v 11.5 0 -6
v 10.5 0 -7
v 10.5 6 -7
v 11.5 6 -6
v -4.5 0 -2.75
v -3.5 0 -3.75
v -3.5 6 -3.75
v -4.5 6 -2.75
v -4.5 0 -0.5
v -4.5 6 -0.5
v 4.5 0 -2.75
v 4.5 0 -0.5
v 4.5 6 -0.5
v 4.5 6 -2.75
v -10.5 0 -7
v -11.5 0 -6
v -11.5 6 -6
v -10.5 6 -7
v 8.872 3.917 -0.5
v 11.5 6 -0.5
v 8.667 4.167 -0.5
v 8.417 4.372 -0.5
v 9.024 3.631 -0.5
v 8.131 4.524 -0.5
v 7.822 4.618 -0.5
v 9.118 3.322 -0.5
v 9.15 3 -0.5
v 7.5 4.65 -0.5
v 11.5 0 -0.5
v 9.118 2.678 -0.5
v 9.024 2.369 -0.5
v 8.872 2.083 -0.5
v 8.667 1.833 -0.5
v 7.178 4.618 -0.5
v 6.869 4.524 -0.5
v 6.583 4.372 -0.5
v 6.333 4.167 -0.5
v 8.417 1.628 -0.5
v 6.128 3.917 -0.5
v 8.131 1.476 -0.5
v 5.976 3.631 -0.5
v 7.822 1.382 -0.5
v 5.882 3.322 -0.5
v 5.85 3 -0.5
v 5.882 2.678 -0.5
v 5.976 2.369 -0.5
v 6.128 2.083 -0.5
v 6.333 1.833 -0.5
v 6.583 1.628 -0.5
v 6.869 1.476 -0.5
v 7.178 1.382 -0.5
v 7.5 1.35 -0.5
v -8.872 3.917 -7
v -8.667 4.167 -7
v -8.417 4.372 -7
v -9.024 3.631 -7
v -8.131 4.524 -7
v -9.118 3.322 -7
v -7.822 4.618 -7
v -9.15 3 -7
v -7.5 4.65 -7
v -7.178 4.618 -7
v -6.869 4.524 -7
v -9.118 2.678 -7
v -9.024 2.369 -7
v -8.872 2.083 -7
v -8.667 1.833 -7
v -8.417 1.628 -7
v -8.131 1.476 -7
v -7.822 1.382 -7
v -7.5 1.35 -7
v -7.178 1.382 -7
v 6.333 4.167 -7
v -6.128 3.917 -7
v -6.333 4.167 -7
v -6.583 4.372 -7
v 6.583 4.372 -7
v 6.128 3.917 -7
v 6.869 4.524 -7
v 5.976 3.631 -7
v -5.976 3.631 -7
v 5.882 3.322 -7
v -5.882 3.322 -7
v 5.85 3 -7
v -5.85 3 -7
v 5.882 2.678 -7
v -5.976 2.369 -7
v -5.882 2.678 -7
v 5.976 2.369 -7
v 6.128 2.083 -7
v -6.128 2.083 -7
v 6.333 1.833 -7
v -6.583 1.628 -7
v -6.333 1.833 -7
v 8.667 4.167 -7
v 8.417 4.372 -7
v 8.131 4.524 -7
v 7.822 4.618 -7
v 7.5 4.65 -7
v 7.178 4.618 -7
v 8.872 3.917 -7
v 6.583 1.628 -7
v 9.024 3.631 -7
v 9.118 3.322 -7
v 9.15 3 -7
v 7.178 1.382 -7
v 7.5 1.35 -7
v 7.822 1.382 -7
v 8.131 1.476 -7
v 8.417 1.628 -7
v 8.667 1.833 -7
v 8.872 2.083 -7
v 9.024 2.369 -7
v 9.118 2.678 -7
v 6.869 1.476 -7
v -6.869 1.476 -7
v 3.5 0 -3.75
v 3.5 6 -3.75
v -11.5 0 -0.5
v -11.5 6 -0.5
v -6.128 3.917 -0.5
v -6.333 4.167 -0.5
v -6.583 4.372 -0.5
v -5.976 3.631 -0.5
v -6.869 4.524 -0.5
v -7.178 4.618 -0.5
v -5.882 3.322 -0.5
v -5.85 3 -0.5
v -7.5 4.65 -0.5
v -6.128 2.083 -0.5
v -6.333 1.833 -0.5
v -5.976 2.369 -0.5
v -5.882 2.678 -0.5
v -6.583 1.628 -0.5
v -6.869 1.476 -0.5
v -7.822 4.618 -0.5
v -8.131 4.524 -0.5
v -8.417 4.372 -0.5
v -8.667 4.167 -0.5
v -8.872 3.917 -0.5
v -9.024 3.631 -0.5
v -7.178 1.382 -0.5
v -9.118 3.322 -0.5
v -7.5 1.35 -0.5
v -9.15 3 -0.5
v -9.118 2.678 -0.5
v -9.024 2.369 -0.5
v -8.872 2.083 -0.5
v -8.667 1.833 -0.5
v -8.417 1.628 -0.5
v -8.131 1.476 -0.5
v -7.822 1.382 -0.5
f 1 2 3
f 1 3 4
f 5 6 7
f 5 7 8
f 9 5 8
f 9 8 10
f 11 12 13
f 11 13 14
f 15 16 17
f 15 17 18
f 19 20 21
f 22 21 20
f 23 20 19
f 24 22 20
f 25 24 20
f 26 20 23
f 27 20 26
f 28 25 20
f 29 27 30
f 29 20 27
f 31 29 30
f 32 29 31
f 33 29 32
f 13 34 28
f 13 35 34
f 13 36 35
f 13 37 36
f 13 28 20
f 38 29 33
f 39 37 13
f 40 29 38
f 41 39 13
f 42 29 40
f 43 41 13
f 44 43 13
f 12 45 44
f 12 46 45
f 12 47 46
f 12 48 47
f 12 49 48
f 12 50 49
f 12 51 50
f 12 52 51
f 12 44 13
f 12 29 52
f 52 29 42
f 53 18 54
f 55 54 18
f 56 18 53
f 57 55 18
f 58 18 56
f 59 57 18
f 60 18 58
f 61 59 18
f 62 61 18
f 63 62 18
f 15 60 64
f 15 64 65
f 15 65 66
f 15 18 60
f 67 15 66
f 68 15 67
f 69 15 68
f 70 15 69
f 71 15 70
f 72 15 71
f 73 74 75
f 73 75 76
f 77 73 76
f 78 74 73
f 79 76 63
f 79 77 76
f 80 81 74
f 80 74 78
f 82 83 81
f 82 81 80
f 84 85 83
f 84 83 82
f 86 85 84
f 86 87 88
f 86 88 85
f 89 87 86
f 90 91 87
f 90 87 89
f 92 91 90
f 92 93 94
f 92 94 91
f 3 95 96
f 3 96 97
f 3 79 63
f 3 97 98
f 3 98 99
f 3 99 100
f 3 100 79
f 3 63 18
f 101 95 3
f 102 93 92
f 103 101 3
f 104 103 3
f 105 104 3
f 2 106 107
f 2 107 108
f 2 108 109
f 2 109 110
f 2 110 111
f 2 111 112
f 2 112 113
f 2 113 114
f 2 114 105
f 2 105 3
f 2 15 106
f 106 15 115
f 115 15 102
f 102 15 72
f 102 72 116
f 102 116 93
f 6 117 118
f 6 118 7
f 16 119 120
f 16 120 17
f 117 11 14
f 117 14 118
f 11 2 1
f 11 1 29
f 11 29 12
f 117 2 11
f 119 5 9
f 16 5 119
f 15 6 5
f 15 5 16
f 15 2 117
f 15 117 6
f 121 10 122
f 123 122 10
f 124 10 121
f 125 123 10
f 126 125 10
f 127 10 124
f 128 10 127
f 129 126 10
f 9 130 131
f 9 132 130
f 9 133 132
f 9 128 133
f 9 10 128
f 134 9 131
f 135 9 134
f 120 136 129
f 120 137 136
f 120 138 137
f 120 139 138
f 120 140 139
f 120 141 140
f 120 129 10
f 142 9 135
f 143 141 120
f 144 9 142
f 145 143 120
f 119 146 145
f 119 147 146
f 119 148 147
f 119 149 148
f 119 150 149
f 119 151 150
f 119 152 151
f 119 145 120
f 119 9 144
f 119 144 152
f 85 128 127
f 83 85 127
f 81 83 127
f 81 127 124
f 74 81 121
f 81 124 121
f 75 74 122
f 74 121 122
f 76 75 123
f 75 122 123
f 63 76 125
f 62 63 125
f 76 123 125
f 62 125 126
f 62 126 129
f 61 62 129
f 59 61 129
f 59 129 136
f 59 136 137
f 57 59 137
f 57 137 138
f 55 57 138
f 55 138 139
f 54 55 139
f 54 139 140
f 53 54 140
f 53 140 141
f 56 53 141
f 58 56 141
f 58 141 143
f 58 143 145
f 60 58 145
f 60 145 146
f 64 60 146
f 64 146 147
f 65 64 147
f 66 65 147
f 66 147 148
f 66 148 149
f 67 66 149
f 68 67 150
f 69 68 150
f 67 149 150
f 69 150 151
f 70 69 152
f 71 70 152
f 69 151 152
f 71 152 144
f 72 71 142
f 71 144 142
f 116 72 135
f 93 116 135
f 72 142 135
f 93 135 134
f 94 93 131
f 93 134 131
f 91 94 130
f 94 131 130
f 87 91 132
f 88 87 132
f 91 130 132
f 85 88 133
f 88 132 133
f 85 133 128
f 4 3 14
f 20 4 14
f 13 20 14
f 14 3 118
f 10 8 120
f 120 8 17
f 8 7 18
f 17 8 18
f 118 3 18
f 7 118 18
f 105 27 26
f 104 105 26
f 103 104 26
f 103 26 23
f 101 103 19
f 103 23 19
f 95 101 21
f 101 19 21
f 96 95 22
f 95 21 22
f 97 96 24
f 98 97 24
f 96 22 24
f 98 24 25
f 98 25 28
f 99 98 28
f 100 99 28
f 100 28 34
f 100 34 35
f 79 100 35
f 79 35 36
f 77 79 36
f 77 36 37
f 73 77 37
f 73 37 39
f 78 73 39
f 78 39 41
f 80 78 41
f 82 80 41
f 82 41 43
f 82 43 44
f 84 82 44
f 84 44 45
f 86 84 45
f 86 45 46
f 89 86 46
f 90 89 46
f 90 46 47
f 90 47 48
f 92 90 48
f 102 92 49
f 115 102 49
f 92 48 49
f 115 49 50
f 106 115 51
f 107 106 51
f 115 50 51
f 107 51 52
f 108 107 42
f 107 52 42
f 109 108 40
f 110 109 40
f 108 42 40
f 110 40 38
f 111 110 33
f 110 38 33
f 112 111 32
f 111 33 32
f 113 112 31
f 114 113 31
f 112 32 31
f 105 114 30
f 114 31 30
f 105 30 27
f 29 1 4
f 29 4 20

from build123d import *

# Parameters (mm, degrees)
EXTRUDE_1_DEPTH     = 6
SKETCH_2_R          = 1.65
CUT_EXTRUDE_1_DEPTH = 8


with BuildPart() as part:
    # 草图1 → 凸台-拉伸1 (new body)
    with BuildSketch(Plane(origin=(0, 0, 0), x_dir=(1, 0, 0), z_dir=(0, 1, 0))):
        Polygon((-11.5, 0.5), (-11.5, 6), (-10.5, 7), (10.5, 7), (11.5, 6), (11.5, 0.5), (4.5, 0.5), (4.5, 2.75), (3.5, 3.75), (-3.5, 3.75), (-4.5, 2.75), (-4.5, 0.5), align=None)
    extrude(amount=EXTRUDE_1_DEPTH)

    # 草图2 → 切除-拉伸1 (cut)
    with BuildSketch(Plane.XY.offset(-0.5)):
        with Locations((-7.5, 3)):
            Circle(SKETCH_2_R)
        with Locations((7.5, 3)):
            Circle(SKETCH_2_R)
    extrude(amount=-CUT_EXTRUDE_1_DEPTH, mode=Mode.SUBTRACT)


solid = part.part
